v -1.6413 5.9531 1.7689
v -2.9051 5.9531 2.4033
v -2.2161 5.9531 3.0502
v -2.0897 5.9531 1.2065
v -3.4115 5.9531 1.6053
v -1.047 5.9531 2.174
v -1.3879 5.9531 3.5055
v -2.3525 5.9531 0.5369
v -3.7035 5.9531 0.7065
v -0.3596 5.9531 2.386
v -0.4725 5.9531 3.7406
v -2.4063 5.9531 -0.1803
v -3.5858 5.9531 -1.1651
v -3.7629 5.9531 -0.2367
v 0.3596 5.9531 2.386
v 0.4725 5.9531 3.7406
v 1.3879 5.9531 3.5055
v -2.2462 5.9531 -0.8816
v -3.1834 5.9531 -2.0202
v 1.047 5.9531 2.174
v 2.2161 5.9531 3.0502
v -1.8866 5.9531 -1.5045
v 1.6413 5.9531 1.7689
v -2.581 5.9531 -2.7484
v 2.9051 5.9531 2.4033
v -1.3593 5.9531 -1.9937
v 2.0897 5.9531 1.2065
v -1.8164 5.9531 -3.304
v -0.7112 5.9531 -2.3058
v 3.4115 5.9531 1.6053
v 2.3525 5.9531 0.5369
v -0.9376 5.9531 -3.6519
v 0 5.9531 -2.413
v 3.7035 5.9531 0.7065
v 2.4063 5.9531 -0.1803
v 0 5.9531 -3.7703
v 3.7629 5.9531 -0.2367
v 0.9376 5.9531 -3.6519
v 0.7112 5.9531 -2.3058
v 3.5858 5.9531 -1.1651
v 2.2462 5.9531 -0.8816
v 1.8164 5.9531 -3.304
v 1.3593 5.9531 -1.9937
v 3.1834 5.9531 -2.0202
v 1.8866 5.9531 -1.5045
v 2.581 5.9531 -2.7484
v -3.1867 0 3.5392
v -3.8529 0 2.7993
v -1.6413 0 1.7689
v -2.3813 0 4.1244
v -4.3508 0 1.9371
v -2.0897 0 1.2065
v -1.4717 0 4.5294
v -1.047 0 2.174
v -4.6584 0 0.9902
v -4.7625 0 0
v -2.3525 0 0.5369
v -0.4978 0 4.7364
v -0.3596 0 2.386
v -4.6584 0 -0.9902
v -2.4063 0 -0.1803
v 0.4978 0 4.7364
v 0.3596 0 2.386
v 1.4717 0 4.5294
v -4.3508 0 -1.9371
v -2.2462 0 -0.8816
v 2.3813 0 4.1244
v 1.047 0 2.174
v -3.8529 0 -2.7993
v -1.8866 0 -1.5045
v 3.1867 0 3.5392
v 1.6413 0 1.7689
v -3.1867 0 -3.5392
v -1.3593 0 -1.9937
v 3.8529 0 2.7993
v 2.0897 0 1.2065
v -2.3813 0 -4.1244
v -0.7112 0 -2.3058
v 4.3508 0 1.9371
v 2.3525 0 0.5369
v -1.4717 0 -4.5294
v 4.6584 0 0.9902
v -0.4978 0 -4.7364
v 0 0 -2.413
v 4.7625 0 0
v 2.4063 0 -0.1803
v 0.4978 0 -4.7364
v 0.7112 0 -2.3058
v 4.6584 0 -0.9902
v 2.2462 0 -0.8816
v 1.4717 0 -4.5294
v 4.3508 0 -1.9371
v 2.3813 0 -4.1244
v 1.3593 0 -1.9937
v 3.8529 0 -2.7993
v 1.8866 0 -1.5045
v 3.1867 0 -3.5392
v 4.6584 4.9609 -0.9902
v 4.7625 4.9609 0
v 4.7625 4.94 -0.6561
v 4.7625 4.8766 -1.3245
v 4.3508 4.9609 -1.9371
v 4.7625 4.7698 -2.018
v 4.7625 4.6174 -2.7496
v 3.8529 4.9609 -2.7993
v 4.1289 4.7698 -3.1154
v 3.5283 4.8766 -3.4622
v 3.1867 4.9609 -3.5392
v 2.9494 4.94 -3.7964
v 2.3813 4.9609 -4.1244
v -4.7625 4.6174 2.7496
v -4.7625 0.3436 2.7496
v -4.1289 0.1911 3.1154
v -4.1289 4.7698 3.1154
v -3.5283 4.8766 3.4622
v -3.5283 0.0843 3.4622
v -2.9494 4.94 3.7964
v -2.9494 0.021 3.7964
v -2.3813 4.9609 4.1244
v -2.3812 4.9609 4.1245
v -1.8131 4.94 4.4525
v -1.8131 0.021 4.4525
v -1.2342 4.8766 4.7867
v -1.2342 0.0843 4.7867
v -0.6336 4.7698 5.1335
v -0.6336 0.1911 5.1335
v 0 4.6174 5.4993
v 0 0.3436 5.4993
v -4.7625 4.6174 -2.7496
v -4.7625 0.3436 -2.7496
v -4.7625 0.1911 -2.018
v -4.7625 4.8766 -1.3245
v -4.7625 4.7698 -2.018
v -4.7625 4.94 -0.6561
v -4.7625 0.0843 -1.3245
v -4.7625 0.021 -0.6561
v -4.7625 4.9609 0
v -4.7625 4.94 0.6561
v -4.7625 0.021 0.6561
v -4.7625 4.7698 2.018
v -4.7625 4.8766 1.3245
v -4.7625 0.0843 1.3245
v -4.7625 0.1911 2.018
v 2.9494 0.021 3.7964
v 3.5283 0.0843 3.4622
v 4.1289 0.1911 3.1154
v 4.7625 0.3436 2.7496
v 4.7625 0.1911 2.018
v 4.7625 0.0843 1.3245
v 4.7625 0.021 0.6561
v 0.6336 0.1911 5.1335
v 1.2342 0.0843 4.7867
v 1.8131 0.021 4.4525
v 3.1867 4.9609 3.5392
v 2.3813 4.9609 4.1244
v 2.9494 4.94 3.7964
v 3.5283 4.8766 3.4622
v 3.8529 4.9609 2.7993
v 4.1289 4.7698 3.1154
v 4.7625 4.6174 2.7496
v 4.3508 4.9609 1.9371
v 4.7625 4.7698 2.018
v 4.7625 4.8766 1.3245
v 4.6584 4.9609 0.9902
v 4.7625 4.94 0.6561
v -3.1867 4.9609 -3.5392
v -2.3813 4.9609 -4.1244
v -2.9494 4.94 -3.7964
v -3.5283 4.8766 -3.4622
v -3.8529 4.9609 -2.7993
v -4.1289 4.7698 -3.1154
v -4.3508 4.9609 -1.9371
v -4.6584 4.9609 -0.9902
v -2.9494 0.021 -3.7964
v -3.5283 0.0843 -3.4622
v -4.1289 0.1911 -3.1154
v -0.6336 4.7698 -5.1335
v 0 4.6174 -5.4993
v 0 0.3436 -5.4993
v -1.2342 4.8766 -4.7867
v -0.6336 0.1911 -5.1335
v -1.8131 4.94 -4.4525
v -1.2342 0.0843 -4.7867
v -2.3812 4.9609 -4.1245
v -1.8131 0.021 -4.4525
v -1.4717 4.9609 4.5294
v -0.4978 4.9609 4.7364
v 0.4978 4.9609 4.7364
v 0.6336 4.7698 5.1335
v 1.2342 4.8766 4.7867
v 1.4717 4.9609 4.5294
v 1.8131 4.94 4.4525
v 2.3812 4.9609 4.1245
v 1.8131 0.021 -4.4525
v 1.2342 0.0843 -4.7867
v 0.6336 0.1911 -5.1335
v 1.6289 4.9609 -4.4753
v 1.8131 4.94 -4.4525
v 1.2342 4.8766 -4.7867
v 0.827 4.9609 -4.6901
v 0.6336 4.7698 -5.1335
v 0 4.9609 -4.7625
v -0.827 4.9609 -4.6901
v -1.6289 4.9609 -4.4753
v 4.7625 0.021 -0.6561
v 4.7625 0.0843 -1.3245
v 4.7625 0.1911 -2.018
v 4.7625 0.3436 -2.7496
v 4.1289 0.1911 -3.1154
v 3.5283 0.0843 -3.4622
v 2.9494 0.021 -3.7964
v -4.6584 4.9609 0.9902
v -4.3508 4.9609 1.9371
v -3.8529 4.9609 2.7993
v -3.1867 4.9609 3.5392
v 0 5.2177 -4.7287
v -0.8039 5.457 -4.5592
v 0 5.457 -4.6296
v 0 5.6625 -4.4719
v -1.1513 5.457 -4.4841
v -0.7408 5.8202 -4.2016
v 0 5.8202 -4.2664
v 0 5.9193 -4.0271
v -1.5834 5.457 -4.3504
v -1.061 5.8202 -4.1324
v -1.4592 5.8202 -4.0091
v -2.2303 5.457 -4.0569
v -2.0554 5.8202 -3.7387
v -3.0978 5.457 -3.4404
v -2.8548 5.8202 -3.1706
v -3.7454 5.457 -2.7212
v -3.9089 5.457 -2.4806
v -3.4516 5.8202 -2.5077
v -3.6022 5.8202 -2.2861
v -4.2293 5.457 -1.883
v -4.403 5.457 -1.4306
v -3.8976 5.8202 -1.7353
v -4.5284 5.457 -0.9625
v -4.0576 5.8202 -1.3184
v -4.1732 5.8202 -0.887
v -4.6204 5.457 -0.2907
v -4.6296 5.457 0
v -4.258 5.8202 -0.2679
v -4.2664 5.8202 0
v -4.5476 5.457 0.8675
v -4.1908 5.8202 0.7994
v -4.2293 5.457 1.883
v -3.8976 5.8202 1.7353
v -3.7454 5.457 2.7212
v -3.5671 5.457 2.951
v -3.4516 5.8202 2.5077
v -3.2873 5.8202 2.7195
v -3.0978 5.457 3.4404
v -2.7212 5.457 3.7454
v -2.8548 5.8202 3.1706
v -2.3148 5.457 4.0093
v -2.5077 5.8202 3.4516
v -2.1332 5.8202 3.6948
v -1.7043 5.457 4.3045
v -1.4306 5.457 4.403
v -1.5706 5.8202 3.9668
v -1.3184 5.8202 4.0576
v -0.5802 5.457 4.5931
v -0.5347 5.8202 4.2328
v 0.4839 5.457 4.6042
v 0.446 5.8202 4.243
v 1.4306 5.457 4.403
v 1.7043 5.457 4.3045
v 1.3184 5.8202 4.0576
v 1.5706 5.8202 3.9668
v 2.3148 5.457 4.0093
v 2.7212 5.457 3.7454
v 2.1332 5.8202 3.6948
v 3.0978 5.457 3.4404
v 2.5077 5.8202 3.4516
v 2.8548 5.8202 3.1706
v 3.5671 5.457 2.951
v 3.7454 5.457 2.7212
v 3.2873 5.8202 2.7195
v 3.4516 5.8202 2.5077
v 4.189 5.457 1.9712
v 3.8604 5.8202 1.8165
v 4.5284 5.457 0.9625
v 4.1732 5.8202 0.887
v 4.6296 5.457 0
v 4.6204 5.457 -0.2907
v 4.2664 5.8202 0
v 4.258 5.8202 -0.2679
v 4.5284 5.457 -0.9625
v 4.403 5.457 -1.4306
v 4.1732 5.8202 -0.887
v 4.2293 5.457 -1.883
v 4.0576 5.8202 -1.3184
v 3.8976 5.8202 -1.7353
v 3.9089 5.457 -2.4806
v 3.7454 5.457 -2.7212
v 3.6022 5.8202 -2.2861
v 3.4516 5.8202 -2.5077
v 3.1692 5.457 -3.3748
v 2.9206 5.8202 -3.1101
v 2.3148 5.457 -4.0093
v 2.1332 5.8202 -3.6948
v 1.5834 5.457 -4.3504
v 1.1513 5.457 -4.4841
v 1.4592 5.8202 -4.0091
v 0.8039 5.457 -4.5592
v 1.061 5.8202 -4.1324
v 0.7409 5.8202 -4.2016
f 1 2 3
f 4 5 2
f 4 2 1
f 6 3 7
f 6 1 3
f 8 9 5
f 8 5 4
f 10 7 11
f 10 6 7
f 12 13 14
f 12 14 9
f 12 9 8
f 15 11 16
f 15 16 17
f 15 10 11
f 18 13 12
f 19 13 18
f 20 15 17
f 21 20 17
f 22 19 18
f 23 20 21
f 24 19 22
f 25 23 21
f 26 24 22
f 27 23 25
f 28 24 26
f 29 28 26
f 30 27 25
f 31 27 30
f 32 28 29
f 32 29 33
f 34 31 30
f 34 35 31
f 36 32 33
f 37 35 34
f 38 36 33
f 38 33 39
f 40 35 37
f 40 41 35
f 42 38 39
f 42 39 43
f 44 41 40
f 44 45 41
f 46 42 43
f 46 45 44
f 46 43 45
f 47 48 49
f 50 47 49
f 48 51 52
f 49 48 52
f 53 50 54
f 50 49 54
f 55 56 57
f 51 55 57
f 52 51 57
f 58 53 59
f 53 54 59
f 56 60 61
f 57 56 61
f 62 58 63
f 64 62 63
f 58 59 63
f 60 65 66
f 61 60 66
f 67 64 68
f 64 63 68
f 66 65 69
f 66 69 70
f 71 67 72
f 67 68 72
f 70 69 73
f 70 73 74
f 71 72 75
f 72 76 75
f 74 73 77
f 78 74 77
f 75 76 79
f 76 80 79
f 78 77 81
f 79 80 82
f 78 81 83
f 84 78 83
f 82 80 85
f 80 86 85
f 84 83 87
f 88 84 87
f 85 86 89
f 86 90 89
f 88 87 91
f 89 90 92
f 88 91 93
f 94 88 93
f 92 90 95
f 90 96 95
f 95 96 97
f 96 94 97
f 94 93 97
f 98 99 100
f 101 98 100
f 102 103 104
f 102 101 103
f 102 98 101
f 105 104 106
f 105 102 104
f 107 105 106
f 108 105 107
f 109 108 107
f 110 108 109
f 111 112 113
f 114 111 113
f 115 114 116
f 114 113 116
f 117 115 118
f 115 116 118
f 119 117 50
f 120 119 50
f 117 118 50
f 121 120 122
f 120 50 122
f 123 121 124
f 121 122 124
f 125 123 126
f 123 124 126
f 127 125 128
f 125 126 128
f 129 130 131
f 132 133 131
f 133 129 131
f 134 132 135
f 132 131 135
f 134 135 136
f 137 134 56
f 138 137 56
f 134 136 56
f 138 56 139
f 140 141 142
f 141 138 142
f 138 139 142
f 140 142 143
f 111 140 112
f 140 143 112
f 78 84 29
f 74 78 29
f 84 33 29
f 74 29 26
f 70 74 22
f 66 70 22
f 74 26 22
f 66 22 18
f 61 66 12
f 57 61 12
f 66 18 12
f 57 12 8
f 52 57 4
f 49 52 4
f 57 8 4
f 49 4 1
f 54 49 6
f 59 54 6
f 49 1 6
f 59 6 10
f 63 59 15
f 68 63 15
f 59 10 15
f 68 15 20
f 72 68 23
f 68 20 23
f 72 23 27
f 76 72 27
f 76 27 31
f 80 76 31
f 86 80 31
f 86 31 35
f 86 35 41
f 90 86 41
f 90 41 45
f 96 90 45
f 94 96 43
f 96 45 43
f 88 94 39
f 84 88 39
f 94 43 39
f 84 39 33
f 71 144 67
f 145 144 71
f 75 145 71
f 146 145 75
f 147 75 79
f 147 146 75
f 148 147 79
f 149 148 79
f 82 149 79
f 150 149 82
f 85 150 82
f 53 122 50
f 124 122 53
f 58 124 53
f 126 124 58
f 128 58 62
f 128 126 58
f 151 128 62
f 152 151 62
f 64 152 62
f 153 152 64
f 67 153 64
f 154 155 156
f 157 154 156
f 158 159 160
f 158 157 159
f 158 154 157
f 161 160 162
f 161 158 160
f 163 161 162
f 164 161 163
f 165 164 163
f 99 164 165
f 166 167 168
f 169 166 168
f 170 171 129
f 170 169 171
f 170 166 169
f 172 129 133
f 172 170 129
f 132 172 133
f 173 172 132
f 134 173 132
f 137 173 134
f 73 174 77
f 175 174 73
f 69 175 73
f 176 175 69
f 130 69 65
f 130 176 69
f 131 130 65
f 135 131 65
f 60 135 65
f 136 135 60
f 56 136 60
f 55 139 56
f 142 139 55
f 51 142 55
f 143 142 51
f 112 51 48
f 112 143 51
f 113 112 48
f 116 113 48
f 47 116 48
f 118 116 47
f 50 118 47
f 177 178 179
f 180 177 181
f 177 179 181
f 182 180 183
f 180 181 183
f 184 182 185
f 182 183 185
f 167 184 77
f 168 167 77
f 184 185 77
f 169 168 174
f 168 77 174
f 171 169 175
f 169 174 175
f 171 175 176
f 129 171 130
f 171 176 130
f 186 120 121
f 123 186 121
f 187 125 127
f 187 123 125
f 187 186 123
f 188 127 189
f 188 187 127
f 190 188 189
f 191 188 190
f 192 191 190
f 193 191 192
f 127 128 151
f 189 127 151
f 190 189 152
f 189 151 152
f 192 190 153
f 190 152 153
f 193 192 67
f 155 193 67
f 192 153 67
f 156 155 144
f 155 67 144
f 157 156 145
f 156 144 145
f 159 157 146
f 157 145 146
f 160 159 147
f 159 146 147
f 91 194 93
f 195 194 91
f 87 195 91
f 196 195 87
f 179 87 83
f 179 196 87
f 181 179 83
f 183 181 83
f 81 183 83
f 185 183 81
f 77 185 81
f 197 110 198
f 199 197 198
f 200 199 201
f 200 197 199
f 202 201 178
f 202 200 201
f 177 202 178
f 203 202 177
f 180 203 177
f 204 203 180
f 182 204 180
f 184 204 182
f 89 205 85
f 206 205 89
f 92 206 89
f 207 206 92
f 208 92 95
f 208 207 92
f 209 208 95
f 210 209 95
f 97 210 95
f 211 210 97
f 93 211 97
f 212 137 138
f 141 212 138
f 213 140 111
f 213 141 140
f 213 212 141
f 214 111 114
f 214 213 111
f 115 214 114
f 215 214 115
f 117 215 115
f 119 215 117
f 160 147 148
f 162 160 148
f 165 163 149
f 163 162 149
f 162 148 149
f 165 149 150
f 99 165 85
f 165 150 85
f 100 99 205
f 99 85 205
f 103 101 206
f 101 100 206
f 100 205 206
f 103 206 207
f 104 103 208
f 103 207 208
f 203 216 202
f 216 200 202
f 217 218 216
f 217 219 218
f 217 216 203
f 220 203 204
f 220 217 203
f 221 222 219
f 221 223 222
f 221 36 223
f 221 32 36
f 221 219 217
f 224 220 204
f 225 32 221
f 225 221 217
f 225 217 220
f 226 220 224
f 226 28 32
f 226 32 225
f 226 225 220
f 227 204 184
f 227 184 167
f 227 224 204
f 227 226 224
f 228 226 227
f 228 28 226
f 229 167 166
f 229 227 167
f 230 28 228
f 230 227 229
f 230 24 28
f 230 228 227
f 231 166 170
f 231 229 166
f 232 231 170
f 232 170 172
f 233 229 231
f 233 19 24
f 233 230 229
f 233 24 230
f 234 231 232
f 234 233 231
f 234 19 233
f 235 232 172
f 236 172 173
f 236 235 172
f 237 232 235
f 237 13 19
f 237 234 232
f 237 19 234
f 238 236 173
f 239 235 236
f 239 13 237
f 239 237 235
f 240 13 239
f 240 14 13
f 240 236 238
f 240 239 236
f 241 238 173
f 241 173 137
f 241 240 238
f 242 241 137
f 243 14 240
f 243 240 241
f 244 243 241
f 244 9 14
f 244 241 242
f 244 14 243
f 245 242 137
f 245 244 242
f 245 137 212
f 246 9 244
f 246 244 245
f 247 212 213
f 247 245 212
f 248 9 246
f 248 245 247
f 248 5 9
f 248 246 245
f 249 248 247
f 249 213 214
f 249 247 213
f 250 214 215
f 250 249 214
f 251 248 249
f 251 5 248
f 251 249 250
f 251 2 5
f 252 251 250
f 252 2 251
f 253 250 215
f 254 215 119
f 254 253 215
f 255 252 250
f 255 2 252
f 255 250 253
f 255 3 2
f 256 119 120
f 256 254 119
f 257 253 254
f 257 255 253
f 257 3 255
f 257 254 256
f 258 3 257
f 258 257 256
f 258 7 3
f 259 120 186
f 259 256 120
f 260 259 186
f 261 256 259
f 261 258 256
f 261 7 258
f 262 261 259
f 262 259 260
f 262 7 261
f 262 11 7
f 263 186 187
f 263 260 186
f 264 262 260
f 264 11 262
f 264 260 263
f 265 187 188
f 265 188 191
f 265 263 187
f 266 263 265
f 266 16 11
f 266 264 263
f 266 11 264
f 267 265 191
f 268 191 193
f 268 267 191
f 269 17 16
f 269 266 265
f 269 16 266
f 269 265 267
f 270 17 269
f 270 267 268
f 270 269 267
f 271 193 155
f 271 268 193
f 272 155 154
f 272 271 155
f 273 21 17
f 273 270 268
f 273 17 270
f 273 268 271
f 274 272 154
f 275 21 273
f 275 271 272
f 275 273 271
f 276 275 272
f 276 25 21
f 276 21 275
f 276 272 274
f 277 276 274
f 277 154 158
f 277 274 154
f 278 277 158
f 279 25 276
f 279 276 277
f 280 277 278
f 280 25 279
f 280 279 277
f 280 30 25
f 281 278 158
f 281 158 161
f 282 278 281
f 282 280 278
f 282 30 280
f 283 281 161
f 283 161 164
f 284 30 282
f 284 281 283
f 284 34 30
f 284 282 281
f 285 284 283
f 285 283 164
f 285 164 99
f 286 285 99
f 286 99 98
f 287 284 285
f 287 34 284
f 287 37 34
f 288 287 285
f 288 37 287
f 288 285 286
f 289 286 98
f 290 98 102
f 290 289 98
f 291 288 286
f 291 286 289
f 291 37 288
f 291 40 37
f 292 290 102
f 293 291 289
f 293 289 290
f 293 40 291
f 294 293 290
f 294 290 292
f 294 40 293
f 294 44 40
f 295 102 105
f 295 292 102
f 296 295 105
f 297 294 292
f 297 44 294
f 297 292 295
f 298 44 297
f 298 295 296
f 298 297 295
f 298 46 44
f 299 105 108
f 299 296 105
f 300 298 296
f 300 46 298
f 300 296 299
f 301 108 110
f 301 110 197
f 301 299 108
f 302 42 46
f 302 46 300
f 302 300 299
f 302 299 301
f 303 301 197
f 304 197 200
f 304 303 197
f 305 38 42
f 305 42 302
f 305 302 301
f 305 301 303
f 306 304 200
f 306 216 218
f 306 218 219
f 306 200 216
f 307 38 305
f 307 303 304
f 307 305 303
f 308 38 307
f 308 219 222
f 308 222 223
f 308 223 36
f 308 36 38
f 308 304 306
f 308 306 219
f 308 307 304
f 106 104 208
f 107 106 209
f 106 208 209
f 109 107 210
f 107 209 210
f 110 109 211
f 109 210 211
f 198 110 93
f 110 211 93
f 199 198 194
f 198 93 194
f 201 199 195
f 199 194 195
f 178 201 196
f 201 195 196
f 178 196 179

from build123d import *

# Parameters (mm, degrees)
EXTRUDE1_DEPTH = 5.953125
SKETCH2_W      = 2.413
SKETCH2_H      = 5.953125


with BuildPart() as part:
    # Sketch1 → Extrude1 (new body)
    with BuildSketch(Plane(origin=(0, 0, 0), x_dir=(1, 0, 0), z_dir=(0, 1, 0))):
        Polygon((0, 5.499261314), (-4.7625, 2.749630657), (-4.7625, -2.749630657), (0, -5.499261314), (4.7625, -2.749630657), (4.7625, 2.749630657), align=None)
    extrude(amount=EXTRUDE1_DEPTH)


with BuildPart() as body_2:
    # Sketch2 → Revolve1 (revolve)
    with BuildSketch(Plane(origin=(0, 0, 0), x_dir=(0, 0, -1), z_dir=(1, 0, 0))):
        with Locations((1.2065, 2.9765625)):
            Rectangle(SKETCH2_W, SKETCH2_H)
    revolve(axis=Axis((0, -2.413, 0), (0, 1, 0)))


with BuildPart() as part_1:
    add(part.part)

    # Combine1: cut body 2
    add(body_2.part, mode=Mode.SUBTRACT)

    # Sketch5 → Cut-Revolve3 (revolve, cut)
    with BuildSketch(Plane(origin=(0, 0, 0), x_dir=(0, 0, -1), z_dir=(1, 0, 0))):
        with BuildLine():
            Line((0, 0), (4.7625, 0))
            Line((4.7625, 0), (5.499261314, 0.343557443))
            Line((5.499261314, 0.343557443), (5.499261314, 4.617380057))
            Line((5.499261314, 4.617380057), (4.7625, 4.9609375))
            ThreePointArc((4.7625, 4.9609375), (4.471895009, 5.662520009), (3.7703125, 5.953125))
            Line((3.7703125, 5.953125), (3.7703125, 7.223125))
            Line((3.7703125, 7.223125), (6.769261314, 7.223125))
            Line((6.769261314, 7.223125), (6.769261314, -1.27))
            Line((6.769261314, -1.27), (0, -1.27))
            Line((0, -1.27), (0, 0))
        make_face()
    revolve(axis=Axis((0, 0, 0), (0, 1, 0)), mode=Mode.SUBTRACT)


solid = part_1.part
